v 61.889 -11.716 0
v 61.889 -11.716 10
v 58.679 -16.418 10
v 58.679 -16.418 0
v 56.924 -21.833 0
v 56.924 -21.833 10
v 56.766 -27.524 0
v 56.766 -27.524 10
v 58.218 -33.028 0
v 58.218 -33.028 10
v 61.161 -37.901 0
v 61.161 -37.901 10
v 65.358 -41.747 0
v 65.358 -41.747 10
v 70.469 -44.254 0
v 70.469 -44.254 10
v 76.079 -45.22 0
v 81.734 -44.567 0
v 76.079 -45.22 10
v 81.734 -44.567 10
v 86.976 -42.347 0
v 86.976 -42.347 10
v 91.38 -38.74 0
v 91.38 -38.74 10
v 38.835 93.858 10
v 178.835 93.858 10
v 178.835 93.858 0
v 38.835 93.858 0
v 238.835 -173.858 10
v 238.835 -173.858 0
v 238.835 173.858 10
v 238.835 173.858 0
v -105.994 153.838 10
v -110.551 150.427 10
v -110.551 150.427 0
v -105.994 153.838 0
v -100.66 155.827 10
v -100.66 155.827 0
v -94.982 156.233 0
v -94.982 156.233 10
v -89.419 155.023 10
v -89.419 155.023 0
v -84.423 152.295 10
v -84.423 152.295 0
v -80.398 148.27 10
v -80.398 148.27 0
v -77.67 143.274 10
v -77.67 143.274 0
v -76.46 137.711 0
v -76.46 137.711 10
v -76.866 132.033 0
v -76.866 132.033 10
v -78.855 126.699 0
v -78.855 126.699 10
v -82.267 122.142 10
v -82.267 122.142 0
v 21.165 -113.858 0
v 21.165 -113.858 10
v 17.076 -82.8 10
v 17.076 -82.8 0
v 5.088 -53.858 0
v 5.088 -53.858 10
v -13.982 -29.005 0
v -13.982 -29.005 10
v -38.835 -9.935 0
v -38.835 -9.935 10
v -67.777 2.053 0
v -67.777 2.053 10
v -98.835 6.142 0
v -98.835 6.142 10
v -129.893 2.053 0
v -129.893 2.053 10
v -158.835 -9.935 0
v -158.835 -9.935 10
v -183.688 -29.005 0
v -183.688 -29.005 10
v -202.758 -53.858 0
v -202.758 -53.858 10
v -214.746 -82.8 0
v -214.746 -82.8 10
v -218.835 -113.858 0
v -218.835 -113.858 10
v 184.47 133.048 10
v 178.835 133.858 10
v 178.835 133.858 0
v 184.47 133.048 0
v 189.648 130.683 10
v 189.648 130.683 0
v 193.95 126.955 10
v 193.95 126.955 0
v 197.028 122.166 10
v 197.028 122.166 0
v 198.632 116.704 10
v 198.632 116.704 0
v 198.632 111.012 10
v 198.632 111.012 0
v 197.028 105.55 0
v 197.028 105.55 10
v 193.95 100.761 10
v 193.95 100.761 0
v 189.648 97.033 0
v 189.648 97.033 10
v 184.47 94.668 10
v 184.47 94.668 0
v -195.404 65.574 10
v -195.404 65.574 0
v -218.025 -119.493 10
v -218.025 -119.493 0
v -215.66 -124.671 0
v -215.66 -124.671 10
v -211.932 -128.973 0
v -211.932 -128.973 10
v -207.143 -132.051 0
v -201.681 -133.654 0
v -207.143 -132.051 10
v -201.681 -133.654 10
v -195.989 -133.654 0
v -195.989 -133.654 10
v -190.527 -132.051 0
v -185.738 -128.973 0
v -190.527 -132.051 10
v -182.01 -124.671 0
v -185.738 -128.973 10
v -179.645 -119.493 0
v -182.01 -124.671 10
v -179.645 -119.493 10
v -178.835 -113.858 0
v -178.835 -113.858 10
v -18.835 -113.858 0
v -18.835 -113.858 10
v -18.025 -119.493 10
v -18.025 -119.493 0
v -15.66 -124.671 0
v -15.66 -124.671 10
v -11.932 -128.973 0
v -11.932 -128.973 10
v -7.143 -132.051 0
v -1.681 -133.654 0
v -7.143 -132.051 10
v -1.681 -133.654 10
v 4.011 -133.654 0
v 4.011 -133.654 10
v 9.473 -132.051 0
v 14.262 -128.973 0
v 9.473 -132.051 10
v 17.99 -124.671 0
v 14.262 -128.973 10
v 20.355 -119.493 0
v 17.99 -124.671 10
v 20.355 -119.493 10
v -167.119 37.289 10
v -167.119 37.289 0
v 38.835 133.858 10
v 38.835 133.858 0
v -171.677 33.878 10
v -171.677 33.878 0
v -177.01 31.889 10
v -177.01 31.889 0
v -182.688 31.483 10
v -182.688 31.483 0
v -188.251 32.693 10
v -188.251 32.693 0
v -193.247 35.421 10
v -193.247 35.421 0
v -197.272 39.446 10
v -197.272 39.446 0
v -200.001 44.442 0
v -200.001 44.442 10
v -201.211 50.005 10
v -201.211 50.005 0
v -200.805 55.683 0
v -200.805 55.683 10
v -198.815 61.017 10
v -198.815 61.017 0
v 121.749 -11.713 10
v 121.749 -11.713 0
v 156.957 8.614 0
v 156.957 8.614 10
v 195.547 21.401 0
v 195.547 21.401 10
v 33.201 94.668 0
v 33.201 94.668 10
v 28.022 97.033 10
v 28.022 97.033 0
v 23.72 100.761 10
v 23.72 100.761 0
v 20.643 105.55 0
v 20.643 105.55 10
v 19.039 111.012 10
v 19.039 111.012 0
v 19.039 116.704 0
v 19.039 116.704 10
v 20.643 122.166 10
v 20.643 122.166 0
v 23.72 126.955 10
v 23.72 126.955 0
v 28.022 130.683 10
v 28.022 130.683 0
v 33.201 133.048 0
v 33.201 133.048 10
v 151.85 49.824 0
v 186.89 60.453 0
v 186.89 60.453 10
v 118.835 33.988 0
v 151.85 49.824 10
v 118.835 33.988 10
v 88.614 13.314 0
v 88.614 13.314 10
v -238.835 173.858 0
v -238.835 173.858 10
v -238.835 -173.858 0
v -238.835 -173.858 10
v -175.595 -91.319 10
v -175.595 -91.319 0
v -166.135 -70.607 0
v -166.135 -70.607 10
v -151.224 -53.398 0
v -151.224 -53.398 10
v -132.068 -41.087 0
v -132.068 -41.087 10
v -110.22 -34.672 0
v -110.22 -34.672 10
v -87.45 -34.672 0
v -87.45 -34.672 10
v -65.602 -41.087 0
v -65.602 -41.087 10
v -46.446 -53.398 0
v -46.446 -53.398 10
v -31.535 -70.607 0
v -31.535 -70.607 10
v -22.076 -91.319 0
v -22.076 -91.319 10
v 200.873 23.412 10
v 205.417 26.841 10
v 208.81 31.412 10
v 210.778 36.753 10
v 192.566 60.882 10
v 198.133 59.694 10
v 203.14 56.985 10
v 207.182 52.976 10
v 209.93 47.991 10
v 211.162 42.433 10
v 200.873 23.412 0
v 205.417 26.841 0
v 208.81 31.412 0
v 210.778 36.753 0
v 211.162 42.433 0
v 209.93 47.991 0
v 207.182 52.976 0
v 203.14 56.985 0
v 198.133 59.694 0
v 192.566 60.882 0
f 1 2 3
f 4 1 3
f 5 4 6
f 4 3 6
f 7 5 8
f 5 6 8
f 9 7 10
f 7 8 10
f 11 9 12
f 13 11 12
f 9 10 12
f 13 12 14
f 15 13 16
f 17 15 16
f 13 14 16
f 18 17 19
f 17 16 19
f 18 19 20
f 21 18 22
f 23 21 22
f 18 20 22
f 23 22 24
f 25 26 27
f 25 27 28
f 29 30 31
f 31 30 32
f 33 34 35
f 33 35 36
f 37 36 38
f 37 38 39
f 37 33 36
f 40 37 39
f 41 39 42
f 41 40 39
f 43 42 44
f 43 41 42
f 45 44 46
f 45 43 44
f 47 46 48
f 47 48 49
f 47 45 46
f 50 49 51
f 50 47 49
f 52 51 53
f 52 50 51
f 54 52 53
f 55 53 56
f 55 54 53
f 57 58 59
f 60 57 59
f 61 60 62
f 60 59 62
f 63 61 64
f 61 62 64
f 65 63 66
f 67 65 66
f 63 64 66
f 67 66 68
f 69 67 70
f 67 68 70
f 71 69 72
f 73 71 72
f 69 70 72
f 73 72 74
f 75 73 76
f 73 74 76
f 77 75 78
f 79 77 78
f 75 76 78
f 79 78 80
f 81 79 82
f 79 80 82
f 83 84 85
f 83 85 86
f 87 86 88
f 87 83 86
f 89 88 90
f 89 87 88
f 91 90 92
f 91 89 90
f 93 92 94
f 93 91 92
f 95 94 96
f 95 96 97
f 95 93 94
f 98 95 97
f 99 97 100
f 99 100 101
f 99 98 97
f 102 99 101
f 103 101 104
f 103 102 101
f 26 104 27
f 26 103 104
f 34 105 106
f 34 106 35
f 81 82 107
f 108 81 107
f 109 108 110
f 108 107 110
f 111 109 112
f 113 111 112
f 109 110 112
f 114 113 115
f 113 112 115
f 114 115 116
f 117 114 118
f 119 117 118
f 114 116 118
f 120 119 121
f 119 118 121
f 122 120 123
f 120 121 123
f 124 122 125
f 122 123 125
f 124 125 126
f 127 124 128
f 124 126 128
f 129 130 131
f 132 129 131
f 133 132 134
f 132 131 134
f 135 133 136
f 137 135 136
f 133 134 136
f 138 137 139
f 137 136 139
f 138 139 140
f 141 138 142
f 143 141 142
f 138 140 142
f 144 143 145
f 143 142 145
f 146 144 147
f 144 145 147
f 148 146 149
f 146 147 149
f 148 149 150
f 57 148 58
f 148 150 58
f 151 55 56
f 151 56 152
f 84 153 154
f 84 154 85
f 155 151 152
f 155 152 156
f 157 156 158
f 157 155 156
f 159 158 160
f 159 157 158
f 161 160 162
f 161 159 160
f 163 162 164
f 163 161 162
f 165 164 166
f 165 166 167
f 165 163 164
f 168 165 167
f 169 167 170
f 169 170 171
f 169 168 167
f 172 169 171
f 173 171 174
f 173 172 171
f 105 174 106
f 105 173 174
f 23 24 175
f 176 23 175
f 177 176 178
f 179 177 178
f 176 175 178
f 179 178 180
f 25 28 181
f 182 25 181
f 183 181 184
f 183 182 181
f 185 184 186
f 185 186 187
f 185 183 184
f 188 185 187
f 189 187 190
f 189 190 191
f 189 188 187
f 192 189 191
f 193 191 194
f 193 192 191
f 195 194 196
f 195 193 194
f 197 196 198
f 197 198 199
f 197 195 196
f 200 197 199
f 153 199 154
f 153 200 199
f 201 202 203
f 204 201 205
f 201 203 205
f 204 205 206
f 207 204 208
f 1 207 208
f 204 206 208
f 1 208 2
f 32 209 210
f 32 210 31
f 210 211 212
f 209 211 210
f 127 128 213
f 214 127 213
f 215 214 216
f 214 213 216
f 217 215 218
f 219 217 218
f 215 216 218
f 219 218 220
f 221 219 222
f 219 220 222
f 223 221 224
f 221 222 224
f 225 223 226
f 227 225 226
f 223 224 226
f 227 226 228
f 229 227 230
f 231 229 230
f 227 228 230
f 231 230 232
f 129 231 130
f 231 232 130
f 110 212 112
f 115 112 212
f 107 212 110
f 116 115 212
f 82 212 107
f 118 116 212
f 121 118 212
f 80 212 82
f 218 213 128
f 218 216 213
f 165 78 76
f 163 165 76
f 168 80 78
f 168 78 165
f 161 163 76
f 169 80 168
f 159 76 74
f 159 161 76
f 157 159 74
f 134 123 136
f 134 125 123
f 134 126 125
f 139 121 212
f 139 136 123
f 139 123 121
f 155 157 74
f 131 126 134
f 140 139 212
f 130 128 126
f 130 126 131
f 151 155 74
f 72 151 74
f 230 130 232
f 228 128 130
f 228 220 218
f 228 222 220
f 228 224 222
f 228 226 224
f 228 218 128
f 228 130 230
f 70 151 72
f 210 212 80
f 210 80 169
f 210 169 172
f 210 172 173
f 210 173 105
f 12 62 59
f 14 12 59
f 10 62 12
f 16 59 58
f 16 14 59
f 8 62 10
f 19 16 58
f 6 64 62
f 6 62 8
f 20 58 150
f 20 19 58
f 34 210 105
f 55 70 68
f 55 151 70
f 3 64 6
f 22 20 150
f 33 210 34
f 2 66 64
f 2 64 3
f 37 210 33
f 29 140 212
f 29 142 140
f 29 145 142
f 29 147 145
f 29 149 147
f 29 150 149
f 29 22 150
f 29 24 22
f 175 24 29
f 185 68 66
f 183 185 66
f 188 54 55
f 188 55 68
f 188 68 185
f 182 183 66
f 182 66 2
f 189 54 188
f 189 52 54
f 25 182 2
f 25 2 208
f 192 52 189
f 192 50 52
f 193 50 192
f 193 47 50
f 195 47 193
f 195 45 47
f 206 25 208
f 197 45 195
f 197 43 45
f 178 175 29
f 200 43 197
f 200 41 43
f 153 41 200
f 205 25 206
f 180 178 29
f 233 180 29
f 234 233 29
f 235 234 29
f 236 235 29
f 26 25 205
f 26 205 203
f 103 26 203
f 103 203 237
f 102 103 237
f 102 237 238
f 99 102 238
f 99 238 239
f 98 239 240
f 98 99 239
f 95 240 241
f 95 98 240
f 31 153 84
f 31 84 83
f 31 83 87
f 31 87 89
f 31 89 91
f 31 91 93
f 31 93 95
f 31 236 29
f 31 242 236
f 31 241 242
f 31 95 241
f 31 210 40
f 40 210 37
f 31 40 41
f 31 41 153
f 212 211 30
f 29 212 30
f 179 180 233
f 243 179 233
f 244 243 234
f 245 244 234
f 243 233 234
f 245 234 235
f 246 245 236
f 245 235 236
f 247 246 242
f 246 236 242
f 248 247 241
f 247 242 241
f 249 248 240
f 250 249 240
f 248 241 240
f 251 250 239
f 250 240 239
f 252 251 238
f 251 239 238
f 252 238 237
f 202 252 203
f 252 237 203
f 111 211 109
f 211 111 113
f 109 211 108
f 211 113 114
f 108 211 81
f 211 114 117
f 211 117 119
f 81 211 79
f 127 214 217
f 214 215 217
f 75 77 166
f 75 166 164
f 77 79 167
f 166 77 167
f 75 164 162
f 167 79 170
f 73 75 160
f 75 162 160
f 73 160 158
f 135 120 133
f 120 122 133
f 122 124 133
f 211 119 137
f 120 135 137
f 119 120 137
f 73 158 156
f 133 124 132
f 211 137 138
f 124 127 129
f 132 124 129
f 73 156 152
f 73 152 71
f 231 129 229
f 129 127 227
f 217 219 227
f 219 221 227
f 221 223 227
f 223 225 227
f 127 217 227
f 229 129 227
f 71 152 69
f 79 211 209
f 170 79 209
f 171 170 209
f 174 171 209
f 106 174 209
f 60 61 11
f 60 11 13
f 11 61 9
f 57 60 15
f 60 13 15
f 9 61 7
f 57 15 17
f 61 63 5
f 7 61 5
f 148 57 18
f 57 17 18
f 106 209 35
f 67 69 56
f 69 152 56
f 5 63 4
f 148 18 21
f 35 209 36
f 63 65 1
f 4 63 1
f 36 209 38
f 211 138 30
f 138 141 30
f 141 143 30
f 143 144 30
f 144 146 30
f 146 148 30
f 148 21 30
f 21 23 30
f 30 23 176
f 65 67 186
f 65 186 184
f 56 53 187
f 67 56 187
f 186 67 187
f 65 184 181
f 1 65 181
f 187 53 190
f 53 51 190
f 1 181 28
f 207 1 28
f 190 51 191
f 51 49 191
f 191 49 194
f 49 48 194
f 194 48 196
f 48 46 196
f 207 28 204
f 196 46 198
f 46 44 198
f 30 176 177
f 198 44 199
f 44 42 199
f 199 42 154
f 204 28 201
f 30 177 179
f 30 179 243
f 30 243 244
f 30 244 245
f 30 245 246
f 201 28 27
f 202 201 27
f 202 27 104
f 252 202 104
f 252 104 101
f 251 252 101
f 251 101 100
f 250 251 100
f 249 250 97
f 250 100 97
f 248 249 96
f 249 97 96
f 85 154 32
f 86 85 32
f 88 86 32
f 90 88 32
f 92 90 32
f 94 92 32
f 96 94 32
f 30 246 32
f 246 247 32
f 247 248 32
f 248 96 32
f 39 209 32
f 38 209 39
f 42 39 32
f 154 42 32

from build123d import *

# Parameters (mm, degrees)
SKETCH1_W           = 477.670351936
SKETCH1_H           = 347.715917952
BOSS_EXTRUDE1_DEPTH = 10
CUT_EXTRUDE1_DEPTH  = 10


with BuildPart() as part:
    # Sketch1 → Boss-Extrude1 (new body)
    with BuildSketch(Plane.XY):
        Rectangle(SKETCH1_W, SKETCH1_H)
    extrude(amount=BOSS_EXTRUDE1_DEPTH)

    # Sketch2 → Cut-Extrude1 (cut)
    with BuildSketch(Plane.XY.offset(10)):
        with BuildLine():
            Line((-195.403718463, 65.573687729), (-110.55090472, 150.426501471))
            ThreePointArc((-110.55090472, 150.426501471), (-82.266633473, 150.426501471), (-82.266633473, 122.142230224))
            Line((-82.266633473, 122.142230224), (-167.119447215, 37.289416482))
            ThreePointArc((-167.119447215, 37.289416482), (-195.403718463, 37.289416482), (-195.403718463, 65.573687729))
        make_face()
        with BuildLine():
            Line((38.835175968, 133.857958976), (178.835175968, 133.857958976))
            ThreePointArc((178.835175968, 133.857958976), (198.835175968, 113.857958976), (178.835175968, 93.857958976))
            Line((178.835175968, 93.857958976), (38.835175968, 93.857958976))
            ThreePointArc((38.835175968, 93.857958976), (18.835175968, 113.857958976), (38.835175968, 133.857958976))
        make_face()
        with BuildLine():
            ThreePointArc((21.164824032, -113.857958976), (-98.835175968, 6.142041024), (-218.835175968, -113.857958976))
            ThreePointArc((-218.835175968, -113.857958976), (-198.835175968, -133.857958976), (-178.835175968, -113.857958976))
            ThreePointArc((-178.835175968, -113.857958976), (-98.835175968, -33.857958976), (-18.835175968, -113.857958976))
            ThreePointArc((-18.835175968, -113.857958976), (1.164824032, -133.857958976), (21.164824032, -113.857958976))
        make_face()
        with BuildLine():
            ThreePointArc((186.889668623, 60.453082732), (118.835175968, 33.988137932), (61.888615133, -11.716309149))
            ThreePointArc((61.888615133, -11.716309149), (63.122357717, -39.973660037), (91.379708606, -38.739917453))
            ThreePointArc((91.379708606, -38.739917453), (138.835175968, -0.65287822), (195.54725318, 21.401242448))
            ThreePointArc((195.54725318, 21.401242448), (210.744381044, 45.255954869), (186.889668623, 60.453082732))
        make_face()
    extrude(amount=-CUT_EXTRUDE1_DEPTH, mode=Mode.SUBTRACT)


solid = part.part
